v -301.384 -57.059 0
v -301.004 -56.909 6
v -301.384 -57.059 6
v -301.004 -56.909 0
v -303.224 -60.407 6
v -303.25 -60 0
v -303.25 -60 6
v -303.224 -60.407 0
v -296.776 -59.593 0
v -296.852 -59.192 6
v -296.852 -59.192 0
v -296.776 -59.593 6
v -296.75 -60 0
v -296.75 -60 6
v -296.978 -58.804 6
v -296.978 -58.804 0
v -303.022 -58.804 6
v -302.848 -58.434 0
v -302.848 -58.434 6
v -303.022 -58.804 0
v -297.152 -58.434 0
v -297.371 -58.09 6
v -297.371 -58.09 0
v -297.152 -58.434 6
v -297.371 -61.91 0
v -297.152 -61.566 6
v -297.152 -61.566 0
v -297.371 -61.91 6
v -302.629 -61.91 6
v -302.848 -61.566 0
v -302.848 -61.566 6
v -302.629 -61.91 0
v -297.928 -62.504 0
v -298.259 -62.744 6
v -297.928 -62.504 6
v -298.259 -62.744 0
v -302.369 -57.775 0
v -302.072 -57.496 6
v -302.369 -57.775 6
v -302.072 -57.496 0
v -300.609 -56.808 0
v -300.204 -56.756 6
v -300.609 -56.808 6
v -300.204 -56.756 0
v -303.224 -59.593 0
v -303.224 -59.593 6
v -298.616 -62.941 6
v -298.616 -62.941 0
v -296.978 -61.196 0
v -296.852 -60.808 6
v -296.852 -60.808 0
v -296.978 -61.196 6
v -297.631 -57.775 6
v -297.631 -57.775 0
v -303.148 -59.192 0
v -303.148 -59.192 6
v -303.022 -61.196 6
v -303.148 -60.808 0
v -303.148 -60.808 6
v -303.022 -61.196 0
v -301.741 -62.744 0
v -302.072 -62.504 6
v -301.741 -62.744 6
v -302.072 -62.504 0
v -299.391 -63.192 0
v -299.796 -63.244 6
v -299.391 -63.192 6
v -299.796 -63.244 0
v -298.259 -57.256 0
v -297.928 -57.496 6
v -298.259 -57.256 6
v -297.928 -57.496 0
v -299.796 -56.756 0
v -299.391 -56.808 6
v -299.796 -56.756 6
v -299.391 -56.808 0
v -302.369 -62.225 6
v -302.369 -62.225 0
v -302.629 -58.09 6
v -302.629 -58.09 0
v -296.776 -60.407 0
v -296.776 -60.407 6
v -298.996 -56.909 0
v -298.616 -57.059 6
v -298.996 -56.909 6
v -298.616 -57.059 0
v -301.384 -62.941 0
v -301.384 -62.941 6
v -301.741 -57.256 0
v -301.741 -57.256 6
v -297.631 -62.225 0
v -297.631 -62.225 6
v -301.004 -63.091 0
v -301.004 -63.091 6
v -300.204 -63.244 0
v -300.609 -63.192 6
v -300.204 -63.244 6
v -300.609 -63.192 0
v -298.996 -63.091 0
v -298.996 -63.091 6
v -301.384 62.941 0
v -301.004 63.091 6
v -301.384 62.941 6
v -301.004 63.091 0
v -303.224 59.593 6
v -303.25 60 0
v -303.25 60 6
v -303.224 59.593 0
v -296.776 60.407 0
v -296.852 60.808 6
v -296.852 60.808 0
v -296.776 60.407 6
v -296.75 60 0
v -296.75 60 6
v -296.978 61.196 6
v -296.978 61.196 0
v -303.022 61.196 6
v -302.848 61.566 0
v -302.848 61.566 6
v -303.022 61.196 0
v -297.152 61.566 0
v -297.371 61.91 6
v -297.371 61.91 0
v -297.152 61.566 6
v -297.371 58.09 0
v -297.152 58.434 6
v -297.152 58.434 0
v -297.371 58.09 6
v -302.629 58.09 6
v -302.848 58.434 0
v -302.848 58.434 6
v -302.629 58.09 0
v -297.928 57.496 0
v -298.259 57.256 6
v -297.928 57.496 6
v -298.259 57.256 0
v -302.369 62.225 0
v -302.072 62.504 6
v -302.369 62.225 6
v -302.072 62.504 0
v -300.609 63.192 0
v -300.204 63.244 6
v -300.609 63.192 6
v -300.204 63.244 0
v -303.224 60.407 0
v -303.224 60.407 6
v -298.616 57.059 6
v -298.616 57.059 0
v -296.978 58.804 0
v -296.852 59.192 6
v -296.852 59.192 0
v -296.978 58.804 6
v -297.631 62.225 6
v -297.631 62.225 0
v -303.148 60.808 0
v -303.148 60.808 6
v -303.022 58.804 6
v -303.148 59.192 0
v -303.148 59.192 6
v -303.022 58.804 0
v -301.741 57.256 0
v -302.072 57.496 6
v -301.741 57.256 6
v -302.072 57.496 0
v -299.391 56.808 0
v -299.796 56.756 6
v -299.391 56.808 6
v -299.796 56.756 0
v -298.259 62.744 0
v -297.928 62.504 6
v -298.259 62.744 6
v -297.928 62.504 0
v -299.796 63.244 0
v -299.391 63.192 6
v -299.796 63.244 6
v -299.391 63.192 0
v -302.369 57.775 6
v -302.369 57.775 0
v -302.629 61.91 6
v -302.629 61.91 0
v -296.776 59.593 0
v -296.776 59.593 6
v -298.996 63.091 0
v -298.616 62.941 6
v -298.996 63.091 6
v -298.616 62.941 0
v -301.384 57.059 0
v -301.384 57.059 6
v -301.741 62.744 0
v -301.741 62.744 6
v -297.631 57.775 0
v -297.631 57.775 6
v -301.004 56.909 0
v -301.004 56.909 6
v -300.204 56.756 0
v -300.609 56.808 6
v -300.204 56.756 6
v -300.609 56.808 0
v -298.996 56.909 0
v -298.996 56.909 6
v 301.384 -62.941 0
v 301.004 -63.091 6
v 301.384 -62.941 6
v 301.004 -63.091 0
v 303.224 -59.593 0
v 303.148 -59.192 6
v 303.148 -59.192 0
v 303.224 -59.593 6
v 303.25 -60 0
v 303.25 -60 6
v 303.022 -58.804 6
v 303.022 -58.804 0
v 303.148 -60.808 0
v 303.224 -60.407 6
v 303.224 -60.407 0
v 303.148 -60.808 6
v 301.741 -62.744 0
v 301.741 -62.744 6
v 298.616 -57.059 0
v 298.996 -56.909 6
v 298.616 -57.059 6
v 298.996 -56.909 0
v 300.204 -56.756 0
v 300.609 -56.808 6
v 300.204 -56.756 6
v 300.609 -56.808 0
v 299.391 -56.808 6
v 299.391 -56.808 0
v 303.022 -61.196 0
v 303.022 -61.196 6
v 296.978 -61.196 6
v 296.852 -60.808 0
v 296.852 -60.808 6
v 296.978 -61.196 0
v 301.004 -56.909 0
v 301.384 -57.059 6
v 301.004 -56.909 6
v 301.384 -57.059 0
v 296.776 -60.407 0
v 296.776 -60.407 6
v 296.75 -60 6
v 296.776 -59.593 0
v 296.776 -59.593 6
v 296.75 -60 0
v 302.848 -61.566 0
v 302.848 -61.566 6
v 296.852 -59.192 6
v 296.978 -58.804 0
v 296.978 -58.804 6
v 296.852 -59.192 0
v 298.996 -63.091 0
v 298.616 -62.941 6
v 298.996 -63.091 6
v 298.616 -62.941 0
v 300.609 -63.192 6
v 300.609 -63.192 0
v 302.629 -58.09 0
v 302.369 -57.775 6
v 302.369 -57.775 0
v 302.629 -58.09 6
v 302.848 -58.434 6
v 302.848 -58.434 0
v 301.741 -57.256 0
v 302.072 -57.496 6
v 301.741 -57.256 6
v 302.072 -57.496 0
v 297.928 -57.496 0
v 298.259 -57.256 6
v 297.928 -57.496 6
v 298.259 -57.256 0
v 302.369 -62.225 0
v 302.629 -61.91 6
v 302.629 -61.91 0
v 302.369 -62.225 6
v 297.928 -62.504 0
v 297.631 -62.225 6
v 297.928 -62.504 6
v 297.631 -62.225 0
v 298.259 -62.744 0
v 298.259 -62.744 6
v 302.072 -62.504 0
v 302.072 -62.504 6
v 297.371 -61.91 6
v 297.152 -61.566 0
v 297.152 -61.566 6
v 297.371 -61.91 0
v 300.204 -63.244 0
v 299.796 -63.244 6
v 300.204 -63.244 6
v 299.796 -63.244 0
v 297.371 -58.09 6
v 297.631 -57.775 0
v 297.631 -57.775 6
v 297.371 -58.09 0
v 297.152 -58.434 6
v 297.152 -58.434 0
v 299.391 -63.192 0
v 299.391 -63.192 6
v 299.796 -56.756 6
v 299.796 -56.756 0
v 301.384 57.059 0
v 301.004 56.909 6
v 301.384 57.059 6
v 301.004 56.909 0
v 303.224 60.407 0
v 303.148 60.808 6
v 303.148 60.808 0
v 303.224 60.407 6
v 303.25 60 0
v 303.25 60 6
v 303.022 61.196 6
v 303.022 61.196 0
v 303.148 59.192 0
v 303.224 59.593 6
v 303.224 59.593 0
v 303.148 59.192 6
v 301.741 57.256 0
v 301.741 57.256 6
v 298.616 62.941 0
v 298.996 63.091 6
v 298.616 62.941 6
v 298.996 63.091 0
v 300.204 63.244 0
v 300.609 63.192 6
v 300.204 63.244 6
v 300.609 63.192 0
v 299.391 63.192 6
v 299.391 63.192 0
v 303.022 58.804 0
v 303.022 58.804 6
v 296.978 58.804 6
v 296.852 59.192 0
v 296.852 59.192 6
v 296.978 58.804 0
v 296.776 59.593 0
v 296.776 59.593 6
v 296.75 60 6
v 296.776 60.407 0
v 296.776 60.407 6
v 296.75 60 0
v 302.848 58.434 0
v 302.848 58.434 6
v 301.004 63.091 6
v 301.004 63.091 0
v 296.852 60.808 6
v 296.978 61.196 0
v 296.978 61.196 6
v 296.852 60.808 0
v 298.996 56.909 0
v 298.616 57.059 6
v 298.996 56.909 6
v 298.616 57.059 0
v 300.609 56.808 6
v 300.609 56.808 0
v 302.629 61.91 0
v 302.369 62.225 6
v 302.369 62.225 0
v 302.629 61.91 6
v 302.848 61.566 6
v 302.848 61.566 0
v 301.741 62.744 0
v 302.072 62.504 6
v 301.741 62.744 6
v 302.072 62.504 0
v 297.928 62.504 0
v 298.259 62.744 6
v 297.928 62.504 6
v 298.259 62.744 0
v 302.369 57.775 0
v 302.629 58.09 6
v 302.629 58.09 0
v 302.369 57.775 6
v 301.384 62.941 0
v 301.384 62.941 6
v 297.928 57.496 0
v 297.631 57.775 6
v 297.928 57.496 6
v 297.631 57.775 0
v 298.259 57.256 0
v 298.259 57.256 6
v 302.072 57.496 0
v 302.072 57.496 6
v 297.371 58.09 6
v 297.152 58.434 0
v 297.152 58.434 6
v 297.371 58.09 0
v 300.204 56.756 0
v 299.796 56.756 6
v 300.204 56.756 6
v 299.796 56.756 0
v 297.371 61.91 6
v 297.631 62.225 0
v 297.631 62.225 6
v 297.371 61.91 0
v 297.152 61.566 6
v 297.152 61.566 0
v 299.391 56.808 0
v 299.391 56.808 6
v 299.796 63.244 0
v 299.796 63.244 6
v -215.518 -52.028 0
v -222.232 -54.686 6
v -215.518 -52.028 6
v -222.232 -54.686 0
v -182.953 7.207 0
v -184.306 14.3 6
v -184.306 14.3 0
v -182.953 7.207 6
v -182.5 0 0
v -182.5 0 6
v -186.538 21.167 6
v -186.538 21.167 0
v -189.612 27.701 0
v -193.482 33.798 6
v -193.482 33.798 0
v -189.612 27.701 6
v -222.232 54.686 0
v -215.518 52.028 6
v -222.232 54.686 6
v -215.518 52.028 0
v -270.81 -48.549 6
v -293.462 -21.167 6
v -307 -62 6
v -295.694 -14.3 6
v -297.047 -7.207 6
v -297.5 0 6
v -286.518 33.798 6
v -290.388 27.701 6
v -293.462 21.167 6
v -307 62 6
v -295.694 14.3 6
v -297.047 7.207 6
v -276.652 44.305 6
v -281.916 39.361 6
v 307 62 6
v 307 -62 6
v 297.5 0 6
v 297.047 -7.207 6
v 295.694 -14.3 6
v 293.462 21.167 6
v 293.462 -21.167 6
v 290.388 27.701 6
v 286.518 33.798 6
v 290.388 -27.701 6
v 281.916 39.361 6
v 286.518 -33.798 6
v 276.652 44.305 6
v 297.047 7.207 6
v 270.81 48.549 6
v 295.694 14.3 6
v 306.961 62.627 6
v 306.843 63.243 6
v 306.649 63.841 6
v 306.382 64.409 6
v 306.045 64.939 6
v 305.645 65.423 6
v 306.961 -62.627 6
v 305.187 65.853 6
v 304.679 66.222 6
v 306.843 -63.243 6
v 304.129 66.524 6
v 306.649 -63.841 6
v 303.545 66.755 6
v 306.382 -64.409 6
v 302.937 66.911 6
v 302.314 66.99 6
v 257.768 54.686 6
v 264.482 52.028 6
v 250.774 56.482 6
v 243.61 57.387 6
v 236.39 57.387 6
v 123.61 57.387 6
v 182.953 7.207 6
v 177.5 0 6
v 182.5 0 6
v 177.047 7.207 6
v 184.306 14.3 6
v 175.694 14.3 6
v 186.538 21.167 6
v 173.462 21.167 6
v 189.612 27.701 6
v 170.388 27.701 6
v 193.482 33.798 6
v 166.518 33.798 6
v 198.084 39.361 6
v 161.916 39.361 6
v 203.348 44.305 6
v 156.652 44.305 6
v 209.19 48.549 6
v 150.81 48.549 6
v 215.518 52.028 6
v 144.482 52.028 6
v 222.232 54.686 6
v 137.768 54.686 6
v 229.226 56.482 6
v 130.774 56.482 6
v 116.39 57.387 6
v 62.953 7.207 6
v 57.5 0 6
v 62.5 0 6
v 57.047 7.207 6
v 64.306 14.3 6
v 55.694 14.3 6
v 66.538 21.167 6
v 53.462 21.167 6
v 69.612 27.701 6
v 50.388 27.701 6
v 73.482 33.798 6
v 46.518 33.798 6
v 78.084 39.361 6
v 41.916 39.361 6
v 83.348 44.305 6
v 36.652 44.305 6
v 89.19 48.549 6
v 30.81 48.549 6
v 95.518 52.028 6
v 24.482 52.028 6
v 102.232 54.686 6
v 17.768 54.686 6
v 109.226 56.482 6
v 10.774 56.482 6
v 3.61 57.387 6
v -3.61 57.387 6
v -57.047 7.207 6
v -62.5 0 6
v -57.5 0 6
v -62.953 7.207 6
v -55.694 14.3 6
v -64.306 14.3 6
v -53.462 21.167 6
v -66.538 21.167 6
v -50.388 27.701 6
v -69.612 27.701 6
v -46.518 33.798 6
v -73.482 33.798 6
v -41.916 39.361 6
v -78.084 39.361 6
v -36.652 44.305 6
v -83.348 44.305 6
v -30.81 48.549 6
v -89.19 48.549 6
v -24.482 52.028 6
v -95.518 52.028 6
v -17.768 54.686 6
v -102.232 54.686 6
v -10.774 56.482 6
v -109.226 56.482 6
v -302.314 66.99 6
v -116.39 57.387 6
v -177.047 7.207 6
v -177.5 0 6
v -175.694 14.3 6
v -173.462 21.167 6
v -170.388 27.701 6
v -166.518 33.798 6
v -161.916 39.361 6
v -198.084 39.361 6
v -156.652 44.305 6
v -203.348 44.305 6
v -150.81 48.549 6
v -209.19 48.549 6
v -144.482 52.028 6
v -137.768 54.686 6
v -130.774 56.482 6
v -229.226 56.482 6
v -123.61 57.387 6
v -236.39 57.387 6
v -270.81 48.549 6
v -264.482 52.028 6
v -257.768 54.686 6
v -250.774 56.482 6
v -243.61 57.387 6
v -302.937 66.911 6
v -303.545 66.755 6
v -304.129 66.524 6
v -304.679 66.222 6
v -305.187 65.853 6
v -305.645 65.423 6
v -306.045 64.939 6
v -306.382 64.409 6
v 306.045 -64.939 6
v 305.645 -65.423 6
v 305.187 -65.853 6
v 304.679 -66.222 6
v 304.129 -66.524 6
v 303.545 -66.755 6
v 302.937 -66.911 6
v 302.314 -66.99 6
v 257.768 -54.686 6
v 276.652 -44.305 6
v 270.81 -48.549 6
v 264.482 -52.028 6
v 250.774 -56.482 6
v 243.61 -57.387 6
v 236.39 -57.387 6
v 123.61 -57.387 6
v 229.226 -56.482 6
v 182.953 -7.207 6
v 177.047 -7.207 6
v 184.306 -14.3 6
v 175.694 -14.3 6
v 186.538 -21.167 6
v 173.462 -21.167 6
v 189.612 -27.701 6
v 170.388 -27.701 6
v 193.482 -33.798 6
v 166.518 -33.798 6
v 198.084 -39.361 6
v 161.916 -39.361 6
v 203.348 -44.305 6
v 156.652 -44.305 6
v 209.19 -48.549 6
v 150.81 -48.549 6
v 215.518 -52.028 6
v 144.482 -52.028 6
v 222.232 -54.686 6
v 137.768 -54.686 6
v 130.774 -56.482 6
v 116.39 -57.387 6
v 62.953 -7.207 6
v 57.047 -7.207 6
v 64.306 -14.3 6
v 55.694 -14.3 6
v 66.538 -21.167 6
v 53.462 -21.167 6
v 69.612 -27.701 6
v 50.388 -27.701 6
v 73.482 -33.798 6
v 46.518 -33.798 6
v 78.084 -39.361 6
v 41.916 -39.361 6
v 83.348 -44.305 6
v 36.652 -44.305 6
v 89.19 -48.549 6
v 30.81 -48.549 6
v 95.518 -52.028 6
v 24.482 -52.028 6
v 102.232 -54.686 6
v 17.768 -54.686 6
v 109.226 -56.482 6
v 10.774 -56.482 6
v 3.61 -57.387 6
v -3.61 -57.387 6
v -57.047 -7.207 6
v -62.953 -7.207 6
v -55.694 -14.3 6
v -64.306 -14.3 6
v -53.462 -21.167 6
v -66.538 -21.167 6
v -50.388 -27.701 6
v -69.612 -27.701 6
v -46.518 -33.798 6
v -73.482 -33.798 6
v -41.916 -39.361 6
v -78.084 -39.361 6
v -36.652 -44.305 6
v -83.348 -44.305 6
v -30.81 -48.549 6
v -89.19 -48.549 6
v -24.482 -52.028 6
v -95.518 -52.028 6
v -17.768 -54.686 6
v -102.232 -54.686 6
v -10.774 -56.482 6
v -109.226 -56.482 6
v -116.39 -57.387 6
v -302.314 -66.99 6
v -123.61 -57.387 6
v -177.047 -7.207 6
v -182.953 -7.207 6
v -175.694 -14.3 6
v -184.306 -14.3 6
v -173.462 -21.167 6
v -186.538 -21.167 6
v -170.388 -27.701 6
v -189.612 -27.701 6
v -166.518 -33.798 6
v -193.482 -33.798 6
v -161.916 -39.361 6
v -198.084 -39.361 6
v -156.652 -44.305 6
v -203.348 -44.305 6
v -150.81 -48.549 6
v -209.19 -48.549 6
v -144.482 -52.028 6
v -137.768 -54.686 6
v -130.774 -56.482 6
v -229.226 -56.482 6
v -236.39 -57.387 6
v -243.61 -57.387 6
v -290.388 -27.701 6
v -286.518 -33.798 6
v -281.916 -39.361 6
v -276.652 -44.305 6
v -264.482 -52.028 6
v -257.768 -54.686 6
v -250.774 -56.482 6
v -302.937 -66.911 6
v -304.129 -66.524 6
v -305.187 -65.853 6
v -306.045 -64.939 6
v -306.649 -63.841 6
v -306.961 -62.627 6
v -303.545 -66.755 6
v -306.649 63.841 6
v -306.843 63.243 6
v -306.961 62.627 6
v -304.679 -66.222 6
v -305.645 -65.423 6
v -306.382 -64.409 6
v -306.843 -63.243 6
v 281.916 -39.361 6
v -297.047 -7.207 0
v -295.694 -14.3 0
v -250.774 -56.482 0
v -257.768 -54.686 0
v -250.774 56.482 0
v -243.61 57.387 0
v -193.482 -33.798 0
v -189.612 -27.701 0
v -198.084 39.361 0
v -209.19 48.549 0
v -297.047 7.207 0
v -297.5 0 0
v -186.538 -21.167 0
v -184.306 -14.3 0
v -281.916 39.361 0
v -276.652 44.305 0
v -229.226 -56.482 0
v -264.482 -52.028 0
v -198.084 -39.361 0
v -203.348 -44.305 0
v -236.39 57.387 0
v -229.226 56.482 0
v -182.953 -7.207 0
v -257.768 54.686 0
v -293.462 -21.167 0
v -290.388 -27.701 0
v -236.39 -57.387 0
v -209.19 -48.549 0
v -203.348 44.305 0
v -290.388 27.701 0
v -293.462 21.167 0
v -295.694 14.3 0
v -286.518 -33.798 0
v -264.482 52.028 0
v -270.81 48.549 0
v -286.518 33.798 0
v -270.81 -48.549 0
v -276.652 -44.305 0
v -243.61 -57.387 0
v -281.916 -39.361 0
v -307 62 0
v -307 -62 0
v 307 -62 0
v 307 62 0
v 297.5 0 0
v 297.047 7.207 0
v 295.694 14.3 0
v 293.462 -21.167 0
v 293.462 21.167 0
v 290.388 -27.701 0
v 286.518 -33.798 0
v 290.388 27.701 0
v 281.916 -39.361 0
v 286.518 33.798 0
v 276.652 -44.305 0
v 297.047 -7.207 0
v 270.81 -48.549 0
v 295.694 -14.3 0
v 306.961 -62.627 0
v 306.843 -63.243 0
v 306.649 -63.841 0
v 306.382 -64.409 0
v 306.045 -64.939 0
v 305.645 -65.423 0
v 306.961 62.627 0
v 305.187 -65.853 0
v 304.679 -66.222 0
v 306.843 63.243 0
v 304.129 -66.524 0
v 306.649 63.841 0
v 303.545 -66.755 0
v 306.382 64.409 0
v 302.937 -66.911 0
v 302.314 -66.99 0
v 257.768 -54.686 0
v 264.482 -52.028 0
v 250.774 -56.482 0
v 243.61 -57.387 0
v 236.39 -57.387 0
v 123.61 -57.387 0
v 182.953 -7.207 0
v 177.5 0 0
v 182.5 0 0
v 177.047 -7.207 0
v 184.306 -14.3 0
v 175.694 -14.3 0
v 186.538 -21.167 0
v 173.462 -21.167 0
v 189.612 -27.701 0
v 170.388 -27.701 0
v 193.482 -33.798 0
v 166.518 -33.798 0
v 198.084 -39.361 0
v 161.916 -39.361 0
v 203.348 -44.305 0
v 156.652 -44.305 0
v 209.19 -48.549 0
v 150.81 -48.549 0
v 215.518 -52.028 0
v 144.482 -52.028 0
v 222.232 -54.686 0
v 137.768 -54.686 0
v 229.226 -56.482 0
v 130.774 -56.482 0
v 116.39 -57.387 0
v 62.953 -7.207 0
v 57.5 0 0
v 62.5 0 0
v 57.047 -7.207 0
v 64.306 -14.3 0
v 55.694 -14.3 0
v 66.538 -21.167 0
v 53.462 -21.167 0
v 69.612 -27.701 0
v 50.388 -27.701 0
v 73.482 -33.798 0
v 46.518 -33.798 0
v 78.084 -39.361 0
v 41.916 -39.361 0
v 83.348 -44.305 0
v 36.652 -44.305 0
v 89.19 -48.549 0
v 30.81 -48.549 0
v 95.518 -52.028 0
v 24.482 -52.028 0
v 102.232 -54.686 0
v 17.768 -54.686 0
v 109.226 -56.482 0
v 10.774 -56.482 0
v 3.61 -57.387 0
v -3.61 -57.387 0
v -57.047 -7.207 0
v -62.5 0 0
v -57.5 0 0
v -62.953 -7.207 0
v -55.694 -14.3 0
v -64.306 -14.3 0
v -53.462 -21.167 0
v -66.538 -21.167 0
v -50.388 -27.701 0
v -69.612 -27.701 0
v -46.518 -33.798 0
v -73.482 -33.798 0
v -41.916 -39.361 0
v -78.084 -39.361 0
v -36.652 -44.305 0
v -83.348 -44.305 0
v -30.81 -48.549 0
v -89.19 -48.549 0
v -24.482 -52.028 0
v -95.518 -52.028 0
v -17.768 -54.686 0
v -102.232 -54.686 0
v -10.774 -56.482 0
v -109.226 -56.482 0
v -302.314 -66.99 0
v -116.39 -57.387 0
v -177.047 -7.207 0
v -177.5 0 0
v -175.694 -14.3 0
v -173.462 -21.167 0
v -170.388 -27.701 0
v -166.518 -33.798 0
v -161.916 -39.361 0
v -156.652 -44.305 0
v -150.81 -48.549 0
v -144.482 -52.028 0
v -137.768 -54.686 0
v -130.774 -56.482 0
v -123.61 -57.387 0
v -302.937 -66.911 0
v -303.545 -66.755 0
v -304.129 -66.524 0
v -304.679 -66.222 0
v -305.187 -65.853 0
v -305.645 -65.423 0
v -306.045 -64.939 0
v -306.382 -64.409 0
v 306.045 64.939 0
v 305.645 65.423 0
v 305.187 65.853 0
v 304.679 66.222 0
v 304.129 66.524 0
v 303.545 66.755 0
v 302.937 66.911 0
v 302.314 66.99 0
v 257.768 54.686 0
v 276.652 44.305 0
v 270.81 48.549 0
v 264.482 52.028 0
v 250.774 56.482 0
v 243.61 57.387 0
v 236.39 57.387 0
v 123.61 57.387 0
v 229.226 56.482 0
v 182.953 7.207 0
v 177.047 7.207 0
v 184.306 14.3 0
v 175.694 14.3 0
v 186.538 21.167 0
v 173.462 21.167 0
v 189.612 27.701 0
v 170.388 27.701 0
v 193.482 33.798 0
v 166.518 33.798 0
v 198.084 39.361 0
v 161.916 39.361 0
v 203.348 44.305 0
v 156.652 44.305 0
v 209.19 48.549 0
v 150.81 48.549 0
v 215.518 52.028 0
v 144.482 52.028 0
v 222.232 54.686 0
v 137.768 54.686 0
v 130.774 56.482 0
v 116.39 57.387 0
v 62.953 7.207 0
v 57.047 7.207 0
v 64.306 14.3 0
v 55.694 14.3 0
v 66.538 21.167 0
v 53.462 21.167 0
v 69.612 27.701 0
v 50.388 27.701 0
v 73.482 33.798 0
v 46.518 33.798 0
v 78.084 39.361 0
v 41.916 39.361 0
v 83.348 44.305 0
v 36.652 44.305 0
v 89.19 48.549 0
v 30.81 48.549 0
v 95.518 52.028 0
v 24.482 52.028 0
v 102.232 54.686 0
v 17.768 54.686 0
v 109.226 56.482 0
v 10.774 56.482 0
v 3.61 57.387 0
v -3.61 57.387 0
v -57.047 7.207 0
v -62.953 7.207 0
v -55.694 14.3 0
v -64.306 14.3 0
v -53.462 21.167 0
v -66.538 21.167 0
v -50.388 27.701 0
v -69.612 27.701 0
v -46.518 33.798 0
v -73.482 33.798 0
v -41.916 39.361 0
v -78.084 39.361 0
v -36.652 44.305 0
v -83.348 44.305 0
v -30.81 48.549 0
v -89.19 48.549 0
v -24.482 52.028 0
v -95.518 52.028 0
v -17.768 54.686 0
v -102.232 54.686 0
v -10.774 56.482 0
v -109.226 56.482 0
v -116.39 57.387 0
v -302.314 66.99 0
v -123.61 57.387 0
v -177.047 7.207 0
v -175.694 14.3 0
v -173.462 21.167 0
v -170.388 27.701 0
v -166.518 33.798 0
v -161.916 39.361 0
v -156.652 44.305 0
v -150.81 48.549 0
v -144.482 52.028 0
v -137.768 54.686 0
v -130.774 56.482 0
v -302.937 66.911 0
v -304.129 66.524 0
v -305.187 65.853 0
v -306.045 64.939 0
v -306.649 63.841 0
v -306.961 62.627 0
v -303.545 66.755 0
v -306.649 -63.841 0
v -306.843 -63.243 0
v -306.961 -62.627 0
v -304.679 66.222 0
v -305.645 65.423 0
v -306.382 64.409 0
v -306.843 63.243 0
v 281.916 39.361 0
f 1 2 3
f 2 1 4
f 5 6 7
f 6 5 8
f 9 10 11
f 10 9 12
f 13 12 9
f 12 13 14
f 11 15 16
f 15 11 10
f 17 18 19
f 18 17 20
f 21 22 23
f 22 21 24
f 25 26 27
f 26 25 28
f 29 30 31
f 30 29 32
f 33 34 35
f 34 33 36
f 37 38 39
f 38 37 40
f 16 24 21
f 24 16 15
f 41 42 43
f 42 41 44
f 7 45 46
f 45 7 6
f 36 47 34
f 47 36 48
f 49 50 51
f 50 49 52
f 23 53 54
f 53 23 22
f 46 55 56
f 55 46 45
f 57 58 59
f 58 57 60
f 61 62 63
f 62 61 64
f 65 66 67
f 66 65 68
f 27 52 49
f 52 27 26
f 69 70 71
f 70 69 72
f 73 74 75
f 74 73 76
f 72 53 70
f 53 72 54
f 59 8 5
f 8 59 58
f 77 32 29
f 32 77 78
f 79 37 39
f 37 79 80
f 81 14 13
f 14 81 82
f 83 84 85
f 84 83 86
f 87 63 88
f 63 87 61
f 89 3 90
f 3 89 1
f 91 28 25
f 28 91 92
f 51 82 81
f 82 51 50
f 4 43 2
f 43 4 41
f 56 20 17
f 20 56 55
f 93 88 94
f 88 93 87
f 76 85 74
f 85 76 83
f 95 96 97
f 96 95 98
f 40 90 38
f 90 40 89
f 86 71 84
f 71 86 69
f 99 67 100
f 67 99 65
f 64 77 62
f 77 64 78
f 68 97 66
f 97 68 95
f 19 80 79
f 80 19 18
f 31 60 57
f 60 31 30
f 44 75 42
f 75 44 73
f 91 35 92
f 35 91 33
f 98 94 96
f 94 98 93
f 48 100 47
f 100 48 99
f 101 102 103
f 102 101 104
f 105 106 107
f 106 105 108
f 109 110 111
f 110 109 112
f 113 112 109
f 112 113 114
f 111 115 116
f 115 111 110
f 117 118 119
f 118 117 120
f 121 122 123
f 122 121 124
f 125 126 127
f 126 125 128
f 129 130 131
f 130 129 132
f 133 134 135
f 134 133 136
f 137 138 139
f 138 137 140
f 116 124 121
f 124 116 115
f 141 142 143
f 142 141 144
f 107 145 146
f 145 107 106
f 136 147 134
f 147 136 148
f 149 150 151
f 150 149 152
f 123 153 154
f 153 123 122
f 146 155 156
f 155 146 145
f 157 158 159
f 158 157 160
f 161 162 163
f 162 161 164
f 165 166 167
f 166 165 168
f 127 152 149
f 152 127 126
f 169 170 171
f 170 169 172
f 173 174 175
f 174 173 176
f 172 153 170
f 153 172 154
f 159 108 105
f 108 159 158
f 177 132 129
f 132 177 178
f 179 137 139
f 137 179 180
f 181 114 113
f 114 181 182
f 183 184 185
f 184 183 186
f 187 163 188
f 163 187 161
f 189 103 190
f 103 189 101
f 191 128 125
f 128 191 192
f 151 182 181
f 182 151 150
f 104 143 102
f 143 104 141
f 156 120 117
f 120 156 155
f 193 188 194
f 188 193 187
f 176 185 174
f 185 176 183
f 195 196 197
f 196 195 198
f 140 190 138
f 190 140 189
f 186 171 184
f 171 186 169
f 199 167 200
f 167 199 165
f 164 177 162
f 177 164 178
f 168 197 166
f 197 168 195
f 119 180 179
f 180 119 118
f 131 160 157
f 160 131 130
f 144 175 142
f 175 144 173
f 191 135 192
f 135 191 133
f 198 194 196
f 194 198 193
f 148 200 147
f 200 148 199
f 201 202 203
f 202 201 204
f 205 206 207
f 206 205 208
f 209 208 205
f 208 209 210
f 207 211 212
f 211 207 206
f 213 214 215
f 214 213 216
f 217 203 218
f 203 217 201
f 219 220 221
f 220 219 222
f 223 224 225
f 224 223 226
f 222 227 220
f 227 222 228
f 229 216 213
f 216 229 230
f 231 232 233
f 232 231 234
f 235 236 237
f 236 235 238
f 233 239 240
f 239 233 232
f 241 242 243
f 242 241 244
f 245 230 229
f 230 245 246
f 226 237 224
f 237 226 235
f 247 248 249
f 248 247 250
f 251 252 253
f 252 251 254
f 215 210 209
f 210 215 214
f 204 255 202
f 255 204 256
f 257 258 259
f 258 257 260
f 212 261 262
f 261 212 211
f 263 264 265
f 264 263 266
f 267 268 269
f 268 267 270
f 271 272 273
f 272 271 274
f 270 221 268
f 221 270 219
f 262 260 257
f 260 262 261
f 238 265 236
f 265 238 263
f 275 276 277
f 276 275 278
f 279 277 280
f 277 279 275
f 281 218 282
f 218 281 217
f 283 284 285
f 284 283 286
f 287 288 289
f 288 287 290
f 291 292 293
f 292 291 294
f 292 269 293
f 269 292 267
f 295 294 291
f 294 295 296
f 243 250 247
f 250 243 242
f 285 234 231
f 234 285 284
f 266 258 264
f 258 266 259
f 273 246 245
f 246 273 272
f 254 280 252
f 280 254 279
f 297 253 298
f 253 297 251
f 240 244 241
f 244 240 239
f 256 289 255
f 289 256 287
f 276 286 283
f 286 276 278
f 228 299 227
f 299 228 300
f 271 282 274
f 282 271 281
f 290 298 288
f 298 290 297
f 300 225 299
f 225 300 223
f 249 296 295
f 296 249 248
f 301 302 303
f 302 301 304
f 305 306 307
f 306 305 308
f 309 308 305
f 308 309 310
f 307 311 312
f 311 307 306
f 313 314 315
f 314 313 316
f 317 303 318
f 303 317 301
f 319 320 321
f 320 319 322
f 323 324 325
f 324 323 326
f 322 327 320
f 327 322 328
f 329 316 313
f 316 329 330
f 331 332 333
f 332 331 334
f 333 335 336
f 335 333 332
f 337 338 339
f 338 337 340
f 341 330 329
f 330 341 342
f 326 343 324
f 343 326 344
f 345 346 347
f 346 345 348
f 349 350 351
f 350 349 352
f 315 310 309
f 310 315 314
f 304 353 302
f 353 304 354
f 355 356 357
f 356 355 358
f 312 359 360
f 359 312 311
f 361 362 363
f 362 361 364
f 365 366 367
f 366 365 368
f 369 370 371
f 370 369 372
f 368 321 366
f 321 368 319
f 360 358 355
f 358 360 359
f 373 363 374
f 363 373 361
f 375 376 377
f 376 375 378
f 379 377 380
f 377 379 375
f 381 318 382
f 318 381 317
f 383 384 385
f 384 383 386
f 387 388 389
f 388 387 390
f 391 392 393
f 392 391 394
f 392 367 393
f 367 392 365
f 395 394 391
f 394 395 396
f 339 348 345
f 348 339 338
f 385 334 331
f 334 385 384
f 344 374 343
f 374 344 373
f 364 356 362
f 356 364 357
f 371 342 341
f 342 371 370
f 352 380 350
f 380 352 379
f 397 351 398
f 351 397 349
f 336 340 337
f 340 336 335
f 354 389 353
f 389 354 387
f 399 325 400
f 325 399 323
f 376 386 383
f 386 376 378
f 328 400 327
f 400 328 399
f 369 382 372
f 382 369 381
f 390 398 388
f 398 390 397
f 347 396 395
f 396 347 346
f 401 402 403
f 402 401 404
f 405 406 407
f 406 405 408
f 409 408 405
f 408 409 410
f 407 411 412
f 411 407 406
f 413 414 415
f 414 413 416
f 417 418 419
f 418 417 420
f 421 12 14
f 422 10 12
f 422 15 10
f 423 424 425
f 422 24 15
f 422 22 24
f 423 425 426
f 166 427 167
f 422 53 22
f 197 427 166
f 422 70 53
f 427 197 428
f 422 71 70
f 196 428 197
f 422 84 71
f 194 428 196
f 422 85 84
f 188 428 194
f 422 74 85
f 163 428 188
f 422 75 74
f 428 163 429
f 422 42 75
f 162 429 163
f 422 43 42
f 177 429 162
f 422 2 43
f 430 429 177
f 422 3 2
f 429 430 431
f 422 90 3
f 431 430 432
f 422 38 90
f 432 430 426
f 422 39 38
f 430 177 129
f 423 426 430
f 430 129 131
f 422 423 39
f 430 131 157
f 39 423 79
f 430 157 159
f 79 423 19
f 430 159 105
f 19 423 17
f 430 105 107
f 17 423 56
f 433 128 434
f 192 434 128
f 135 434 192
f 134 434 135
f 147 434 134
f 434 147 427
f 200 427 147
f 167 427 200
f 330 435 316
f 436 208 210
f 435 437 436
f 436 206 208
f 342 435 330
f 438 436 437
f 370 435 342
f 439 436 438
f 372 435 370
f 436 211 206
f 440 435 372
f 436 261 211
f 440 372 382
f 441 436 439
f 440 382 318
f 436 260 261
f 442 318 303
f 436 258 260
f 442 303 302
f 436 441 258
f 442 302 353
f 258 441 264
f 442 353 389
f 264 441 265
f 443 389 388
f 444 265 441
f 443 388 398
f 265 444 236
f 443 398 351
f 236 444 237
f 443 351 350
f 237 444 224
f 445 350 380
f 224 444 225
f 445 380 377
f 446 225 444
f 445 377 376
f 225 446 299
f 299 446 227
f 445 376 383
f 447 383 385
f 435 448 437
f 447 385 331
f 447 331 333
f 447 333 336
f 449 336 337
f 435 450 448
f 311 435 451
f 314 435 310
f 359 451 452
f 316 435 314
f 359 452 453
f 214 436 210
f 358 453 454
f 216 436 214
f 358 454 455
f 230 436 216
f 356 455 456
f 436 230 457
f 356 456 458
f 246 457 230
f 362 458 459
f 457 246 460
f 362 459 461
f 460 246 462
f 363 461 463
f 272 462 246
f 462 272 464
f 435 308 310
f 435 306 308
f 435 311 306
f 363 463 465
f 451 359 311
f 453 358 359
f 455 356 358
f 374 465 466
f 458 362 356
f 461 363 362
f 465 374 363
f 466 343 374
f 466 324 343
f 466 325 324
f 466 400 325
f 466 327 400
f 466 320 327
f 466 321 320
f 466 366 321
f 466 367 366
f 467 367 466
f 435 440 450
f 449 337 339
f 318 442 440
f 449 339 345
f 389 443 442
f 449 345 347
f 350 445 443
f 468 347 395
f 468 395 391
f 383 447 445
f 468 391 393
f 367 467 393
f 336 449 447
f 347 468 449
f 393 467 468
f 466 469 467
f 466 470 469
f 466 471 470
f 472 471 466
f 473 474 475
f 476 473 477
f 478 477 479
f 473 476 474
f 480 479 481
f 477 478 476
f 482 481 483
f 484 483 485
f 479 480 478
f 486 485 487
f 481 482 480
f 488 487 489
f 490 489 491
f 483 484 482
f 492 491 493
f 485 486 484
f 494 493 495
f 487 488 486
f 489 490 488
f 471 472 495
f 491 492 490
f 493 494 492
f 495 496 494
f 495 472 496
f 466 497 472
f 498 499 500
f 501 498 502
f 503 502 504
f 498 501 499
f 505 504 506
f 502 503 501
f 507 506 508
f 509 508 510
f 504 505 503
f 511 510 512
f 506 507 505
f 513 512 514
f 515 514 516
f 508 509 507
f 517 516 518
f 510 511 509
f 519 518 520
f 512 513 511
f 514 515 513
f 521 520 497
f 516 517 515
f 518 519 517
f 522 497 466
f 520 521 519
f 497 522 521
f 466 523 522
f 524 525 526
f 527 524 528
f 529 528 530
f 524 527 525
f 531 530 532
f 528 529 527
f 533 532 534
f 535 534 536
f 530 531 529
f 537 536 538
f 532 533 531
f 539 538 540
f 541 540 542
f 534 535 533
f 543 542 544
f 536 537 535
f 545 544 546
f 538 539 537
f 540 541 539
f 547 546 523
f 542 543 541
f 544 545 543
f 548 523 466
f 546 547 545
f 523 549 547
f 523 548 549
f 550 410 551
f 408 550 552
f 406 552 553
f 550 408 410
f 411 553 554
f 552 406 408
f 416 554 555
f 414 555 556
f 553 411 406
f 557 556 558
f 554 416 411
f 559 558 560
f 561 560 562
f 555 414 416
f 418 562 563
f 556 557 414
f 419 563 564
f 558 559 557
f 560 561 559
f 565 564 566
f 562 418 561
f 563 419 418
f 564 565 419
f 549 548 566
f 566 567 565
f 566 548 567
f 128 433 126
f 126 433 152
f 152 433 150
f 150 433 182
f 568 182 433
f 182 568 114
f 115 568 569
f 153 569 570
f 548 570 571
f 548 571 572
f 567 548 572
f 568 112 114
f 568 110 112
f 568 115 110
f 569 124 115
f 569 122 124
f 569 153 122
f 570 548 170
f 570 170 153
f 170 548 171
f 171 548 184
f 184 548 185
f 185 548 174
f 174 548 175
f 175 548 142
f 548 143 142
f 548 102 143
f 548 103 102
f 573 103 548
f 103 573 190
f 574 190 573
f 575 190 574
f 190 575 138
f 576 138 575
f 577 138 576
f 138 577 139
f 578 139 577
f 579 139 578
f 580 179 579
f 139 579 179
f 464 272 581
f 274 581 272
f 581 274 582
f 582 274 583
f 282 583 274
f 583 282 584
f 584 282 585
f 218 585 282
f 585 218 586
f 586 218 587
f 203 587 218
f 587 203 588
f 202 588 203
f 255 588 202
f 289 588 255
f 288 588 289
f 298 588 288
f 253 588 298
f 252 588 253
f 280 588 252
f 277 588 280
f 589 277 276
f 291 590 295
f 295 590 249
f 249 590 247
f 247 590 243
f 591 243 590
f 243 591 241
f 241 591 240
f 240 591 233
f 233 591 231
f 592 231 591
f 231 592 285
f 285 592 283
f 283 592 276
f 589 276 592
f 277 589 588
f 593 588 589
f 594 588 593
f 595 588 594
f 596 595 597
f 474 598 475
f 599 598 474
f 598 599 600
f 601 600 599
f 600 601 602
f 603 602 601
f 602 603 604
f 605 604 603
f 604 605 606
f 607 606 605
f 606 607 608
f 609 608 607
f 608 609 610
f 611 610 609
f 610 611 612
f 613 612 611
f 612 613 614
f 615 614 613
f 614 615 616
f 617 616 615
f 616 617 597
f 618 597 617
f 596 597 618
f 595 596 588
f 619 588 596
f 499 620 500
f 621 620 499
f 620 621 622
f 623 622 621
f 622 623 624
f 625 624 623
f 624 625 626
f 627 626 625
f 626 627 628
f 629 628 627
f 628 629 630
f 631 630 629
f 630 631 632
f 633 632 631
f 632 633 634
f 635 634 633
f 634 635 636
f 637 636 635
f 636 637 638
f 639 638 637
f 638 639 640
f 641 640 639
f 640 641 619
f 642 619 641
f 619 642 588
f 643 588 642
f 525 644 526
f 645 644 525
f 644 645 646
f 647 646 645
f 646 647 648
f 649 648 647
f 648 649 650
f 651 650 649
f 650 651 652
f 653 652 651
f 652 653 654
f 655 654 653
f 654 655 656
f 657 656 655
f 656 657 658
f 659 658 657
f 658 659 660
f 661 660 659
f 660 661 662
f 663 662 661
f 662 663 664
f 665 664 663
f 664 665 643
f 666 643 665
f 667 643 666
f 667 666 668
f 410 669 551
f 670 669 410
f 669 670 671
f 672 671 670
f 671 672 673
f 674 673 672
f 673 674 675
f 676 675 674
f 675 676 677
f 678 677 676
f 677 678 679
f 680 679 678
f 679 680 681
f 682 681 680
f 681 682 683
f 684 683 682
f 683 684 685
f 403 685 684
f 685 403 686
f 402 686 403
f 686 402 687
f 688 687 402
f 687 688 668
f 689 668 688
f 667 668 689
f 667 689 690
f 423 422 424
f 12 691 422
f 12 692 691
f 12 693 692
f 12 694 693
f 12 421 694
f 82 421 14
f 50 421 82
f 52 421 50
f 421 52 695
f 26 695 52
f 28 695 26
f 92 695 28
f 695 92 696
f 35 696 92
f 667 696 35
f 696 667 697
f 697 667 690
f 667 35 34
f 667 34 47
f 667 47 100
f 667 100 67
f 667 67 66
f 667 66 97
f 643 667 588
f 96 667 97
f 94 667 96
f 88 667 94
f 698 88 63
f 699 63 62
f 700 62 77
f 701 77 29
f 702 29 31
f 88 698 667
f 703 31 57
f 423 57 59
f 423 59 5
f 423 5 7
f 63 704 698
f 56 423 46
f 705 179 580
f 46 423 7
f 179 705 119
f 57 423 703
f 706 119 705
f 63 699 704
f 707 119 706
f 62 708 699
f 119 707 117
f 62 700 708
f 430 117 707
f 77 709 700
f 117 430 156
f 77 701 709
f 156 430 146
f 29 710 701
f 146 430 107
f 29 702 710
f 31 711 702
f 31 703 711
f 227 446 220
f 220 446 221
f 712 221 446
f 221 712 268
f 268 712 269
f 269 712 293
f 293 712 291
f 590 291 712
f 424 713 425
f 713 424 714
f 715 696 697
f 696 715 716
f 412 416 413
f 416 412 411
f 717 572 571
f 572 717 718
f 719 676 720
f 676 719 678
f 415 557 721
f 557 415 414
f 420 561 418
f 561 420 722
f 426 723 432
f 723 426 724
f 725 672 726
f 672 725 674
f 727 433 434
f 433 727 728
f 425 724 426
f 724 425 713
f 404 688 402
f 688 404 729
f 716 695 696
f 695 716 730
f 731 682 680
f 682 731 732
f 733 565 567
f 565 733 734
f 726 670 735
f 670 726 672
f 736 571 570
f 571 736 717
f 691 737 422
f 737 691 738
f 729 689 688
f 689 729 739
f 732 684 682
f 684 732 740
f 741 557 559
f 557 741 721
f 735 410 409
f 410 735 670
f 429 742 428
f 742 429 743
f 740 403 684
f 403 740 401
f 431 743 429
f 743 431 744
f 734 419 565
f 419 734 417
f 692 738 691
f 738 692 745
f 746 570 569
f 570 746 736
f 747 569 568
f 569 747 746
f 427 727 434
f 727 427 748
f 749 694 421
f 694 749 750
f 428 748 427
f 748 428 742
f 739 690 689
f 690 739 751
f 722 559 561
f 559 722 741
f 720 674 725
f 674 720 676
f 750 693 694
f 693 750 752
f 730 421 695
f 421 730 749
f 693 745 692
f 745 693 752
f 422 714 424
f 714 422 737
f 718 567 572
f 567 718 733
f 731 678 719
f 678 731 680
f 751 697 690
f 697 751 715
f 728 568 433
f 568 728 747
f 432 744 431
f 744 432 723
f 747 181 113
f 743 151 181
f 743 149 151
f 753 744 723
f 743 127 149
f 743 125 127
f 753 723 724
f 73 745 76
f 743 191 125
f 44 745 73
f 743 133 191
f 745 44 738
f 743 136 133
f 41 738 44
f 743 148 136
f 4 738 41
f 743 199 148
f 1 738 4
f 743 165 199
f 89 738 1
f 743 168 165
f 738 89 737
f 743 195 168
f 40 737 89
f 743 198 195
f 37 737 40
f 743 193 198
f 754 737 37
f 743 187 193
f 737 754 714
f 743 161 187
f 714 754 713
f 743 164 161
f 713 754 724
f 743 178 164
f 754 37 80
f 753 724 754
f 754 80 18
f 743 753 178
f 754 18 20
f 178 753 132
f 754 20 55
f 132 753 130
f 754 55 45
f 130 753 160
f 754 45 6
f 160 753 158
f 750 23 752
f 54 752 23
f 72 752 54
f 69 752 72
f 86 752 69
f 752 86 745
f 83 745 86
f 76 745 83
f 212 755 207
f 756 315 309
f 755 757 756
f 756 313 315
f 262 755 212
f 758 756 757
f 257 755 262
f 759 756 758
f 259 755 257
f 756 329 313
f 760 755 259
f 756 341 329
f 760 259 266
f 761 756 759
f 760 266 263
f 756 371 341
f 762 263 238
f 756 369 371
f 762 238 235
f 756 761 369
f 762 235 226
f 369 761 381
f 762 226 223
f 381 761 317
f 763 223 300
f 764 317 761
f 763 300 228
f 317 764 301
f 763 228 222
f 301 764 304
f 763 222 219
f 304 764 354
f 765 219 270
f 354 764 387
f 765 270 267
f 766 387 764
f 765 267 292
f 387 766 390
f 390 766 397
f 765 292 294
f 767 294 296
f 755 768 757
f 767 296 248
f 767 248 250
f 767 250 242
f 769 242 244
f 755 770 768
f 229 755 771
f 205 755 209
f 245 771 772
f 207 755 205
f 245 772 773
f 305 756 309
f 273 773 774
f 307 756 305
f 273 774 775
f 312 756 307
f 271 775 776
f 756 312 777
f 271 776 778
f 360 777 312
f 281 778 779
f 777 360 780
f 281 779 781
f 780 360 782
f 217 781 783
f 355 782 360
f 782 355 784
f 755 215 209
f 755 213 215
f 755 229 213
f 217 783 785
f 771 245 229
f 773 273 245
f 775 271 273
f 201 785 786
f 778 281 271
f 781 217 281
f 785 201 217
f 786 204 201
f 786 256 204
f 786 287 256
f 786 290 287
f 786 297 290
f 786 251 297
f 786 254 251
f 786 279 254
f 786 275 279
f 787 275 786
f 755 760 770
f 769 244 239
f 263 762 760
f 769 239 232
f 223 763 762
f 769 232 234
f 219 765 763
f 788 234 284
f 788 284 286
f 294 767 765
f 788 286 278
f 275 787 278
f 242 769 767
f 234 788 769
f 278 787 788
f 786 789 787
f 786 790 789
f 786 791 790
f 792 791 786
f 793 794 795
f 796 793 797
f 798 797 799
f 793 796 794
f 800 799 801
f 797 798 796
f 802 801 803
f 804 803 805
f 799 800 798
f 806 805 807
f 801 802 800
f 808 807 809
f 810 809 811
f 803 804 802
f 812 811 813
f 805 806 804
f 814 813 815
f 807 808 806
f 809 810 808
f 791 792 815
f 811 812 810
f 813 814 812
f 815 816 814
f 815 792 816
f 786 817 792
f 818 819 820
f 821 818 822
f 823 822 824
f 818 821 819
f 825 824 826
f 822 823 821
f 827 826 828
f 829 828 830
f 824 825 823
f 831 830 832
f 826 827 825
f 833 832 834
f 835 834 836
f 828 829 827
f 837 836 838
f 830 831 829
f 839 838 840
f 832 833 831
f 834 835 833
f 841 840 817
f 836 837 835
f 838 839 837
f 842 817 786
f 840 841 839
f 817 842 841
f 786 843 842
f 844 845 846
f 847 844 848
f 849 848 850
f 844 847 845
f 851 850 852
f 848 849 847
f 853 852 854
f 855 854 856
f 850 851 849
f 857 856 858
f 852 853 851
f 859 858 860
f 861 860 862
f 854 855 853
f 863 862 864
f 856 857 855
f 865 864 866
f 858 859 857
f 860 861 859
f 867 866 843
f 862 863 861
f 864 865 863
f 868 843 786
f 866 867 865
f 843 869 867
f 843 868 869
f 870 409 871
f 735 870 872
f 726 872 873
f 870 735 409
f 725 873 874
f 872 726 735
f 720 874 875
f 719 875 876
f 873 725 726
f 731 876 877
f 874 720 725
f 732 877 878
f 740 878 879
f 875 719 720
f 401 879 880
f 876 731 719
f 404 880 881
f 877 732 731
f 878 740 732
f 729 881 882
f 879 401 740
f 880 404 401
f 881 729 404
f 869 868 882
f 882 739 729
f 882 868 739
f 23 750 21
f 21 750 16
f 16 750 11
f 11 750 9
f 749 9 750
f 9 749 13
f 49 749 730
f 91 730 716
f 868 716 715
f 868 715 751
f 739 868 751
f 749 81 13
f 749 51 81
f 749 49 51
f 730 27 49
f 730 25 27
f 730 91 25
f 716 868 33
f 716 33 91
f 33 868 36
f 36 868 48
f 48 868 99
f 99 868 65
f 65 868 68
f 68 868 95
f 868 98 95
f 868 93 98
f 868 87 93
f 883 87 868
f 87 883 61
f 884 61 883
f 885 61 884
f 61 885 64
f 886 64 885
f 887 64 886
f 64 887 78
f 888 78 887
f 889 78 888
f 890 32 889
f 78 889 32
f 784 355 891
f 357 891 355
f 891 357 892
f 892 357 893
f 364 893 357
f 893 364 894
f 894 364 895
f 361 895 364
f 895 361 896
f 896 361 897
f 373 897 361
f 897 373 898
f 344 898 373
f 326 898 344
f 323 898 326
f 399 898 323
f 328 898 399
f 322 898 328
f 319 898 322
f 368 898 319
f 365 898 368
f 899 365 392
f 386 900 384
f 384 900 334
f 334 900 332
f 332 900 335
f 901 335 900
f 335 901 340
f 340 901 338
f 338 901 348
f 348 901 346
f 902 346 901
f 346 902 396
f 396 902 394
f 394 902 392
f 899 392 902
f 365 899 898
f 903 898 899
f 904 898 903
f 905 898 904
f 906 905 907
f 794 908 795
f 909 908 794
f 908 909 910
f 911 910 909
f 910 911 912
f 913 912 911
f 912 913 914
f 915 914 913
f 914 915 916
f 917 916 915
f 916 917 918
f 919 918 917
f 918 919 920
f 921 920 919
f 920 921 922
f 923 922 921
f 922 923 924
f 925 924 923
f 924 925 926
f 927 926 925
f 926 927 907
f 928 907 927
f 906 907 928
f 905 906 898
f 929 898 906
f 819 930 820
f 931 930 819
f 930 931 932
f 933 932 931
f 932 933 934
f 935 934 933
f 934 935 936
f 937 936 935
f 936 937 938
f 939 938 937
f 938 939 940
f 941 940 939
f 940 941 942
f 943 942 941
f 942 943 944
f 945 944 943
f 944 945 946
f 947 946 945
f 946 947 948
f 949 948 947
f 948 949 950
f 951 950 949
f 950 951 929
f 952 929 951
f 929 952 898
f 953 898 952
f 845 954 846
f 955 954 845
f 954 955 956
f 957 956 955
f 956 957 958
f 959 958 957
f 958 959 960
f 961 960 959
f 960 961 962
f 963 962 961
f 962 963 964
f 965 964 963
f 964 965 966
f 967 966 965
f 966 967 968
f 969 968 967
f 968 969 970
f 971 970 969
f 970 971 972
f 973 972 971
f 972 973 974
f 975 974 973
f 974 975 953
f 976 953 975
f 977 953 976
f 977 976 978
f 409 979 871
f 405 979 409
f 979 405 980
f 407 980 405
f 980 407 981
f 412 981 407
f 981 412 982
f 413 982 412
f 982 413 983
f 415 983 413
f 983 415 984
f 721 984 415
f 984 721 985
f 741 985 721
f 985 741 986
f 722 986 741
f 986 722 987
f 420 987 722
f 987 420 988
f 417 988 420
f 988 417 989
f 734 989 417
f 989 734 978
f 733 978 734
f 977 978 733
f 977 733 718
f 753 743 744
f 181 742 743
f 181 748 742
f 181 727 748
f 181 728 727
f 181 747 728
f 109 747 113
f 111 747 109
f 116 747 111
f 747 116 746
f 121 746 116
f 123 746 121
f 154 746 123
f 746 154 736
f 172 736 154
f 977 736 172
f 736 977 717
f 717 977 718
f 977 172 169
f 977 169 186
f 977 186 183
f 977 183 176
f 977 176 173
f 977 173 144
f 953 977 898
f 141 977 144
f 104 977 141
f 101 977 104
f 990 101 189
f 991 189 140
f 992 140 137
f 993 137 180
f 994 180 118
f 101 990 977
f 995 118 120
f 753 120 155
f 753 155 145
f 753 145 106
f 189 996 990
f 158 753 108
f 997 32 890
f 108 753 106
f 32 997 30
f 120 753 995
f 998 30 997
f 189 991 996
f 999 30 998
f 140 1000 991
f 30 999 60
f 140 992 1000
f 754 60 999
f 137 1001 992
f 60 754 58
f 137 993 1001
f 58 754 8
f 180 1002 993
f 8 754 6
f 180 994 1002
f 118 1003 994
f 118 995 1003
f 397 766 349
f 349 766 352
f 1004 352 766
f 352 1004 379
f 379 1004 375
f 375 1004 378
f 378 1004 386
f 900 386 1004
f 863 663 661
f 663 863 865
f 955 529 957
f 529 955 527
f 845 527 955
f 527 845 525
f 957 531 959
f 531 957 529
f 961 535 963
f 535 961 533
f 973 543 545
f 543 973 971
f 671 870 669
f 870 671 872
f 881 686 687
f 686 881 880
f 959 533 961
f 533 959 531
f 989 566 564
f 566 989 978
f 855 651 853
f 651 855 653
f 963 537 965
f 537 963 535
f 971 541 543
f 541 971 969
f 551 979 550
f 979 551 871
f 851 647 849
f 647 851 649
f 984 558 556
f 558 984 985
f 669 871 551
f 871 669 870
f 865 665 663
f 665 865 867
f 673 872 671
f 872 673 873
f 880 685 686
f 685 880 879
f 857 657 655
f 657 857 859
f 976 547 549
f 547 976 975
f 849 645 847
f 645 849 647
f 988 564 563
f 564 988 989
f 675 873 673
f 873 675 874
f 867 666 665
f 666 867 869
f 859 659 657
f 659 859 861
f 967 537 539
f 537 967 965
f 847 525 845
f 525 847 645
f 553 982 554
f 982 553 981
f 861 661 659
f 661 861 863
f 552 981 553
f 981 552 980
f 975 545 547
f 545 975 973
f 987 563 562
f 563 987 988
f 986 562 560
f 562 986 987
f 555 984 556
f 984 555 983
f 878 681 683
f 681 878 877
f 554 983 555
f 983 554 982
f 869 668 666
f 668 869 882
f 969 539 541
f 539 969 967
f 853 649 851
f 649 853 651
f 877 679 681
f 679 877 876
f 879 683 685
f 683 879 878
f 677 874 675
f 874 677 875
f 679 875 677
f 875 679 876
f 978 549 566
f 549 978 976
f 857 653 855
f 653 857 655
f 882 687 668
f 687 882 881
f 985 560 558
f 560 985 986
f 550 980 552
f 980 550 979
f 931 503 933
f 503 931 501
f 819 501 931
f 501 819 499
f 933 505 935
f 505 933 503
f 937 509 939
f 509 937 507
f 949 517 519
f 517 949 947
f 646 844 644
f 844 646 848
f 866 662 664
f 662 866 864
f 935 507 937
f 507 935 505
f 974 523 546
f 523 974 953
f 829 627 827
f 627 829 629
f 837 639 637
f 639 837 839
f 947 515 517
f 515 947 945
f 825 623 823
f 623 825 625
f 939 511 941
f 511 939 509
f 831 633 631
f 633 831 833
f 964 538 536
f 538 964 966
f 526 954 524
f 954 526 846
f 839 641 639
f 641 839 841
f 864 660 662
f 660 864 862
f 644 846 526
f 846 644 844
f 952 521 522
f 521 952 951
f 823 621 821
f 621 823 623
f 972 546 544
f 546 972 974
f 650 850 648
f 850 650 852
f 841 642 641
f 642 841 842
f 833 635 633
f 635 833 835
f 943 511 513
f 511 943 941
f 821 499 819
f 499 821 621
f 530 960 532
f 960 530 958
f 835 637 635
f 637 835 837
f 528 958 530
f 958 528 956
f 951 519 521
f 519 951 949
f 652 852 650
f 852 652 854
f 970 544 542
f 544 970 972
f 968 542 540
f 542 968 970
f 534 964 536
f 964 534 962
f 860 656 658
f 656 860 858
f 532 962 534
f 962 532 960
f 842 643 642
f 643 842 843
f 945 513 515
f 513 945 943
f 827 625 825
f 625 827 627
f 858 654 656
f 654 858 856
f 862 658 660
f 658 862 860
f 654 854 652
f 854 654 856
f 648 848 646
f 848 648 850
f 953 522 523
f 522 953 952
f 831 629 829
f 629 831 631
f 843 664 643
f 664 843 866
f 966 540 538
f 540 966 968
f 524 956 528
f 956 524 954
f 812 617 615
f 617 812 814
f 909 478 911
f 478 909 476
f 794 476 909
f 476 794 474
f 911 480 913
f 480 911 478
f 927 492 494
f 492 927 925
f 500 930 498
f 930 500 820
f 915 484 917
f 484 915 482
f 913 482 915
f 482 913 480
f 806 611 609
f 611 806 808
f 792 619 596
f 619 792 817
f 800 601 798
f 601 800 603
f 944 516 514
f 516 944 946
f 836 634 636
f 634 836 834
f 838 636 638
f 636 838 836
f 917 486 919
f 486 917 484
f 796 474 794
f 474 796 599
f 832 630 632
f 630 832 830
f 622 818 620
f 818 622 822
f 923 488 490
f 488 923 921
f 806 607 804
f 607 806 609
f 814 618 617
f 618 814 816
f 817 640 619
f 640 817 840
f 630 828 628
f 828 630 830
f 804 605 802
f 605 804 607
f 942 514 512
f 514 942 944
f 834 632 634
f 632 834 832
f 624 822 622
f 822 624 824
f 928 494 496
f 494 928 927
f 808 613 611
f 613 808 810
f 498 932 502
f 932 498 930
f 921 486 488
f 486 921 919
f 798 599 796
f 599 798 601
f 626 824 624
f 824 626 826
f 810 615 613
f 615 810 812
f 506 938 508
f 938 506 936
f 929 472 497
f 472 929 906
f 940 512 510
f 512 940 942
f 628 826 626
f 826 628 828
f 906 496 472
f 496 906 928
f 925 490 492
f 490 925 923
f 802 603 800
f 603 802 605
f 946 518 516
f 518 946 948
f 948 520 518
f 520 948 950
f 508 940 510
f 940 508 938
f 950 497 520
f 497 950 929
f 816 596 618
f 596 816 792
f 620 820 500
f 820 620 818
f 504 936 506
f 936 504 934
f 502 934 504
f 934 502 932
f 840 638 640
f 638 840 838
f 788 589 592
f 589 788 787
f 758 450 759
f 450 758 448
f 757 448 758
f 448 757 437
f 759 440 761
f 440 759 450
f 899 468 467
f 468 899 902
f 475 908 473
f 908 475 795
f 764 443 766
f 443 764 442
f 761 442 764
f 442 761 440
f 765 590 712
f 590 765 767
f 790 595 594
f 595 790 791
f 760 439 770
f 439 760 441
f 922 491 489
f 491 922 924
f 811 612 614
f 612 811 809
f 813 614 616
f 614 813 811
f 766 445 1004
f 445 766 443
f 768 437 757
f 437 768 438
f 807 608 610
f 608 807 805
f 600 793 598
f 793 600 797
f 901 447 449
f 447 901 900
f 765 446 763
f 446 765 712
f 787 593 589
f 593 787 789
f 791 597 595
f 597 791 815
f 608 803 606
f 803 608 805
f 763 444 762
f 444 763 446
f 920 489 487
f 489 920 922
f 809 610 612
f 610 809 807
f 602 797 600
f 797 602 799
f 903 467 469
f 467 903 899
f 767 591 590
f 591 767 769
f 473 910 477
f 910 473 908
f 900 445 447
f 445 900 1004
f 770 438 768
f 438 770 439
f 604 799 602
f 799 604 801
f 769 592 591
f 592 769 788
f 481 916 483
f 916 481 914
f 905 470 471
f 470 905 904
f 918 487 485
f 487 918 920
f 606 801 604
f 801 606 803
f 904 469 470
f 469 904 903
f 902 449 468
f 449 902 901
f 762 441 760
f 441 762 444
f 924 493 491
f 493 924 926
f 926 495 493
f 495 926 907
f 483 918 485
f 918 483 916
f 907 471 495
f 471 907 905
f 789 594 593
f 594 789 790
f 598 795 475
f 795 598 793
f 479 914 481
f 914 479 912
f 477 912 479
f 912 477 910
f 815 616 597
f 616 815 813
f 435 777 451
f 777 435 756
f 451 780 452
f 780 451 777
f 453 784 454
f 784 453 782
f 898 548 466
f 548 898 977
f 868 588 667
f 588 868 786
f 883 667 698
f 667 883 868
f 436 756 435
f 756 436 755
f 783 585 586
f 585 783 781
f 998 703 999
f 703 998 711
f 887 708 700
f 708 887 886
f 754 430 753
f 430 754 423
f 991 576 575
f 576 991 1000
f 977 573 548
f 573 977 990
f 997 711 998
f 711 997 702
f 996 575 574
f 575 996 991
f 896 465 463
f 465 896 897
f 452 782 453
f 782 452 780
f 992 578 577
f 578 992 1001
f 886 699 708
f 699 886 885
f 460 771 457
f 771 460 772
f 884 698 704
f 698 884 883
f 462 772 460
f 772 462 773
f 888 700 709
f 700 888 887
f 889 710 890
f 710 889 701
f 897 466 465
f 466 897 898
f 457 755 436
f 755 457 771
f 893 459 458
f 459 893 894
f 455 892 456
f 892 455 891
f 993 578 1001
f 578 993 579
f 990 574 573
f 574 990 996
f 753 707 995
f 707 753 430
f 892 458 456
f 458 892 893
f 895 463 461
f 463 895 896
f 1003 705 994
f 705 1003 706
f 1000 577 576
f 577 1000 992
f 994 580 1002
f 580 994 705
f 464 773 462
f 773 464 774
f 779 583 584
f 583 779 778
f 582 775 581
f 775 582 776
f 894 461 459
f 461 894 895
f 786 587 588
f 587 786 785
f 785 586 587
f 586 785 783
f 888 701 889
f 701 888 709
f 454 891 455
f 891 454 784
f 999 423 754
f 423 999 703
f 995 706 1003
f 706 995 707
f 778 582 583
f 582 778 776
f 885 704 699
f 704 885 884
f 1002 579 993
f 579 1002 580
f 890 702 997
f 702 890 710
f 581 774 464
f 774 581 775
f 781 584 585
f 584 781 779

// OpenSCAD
$fn = 50;


difference() {
	union() {
		hull() {
			translate(v = [-302.0000000000, 62.0000000000, 0]) {
				cylinder(h = 6, r = 5);
			}
			translate(v = [302.0000000000, 62.0000000000, 0]) {
				cylinder(h = 6, r = 5);
			}
			translate(v = [-302.0000000000, -62.0000000000, 0]) {
				cylinder(h = 6, r = 5);
			}
			translate(v = [302.0000000000, -62.0000000000, 0]) {
				cylinder(h = 6, r = 5);
			}
		}
	}
	union() {
		#translate(v = [-300.0000000000, -60.0000000000, -100.0000000000]) {
			cylinder(h = 200, r = 3.2500000000);
		}
		#translate(v = [-300.0000000000, 60.0000000000, -100.0000000000]) {
			cylinder(h = 200, r = 3.2500000000);
		}
		#translate(v = [300.0000000000, -60.0000000000, -100.0000000000]) {
			cylinder(h = 200, r = 3.2500000000);
		}
		#translate(v = [300.0000000000, 60.0000000000, -100.0000000000]) {
			cylinder(h = 200, r = 3.2500000000);
		}
		#translate(v = [-240.0000000000, 0, 0]) {
			cylinder(h = 6, r = 57.5000000000);
		}
		#translate(v = [-120.0000000000, 0, 0]) {
			cylinder(h = 6, r = 57.5000000000);
		}
		#cylinder(h = 6, r = 57.5000000000);
		#translate(v = [120.0000000000, 0, 0]) {
			cylinder(h = 6, r = 57.5000000000);
		}
		#translate(v = [240.0000000000, 0, 0]) {
			cylinder(h = 6, r = 57.5000000000);
		}
	}
}
